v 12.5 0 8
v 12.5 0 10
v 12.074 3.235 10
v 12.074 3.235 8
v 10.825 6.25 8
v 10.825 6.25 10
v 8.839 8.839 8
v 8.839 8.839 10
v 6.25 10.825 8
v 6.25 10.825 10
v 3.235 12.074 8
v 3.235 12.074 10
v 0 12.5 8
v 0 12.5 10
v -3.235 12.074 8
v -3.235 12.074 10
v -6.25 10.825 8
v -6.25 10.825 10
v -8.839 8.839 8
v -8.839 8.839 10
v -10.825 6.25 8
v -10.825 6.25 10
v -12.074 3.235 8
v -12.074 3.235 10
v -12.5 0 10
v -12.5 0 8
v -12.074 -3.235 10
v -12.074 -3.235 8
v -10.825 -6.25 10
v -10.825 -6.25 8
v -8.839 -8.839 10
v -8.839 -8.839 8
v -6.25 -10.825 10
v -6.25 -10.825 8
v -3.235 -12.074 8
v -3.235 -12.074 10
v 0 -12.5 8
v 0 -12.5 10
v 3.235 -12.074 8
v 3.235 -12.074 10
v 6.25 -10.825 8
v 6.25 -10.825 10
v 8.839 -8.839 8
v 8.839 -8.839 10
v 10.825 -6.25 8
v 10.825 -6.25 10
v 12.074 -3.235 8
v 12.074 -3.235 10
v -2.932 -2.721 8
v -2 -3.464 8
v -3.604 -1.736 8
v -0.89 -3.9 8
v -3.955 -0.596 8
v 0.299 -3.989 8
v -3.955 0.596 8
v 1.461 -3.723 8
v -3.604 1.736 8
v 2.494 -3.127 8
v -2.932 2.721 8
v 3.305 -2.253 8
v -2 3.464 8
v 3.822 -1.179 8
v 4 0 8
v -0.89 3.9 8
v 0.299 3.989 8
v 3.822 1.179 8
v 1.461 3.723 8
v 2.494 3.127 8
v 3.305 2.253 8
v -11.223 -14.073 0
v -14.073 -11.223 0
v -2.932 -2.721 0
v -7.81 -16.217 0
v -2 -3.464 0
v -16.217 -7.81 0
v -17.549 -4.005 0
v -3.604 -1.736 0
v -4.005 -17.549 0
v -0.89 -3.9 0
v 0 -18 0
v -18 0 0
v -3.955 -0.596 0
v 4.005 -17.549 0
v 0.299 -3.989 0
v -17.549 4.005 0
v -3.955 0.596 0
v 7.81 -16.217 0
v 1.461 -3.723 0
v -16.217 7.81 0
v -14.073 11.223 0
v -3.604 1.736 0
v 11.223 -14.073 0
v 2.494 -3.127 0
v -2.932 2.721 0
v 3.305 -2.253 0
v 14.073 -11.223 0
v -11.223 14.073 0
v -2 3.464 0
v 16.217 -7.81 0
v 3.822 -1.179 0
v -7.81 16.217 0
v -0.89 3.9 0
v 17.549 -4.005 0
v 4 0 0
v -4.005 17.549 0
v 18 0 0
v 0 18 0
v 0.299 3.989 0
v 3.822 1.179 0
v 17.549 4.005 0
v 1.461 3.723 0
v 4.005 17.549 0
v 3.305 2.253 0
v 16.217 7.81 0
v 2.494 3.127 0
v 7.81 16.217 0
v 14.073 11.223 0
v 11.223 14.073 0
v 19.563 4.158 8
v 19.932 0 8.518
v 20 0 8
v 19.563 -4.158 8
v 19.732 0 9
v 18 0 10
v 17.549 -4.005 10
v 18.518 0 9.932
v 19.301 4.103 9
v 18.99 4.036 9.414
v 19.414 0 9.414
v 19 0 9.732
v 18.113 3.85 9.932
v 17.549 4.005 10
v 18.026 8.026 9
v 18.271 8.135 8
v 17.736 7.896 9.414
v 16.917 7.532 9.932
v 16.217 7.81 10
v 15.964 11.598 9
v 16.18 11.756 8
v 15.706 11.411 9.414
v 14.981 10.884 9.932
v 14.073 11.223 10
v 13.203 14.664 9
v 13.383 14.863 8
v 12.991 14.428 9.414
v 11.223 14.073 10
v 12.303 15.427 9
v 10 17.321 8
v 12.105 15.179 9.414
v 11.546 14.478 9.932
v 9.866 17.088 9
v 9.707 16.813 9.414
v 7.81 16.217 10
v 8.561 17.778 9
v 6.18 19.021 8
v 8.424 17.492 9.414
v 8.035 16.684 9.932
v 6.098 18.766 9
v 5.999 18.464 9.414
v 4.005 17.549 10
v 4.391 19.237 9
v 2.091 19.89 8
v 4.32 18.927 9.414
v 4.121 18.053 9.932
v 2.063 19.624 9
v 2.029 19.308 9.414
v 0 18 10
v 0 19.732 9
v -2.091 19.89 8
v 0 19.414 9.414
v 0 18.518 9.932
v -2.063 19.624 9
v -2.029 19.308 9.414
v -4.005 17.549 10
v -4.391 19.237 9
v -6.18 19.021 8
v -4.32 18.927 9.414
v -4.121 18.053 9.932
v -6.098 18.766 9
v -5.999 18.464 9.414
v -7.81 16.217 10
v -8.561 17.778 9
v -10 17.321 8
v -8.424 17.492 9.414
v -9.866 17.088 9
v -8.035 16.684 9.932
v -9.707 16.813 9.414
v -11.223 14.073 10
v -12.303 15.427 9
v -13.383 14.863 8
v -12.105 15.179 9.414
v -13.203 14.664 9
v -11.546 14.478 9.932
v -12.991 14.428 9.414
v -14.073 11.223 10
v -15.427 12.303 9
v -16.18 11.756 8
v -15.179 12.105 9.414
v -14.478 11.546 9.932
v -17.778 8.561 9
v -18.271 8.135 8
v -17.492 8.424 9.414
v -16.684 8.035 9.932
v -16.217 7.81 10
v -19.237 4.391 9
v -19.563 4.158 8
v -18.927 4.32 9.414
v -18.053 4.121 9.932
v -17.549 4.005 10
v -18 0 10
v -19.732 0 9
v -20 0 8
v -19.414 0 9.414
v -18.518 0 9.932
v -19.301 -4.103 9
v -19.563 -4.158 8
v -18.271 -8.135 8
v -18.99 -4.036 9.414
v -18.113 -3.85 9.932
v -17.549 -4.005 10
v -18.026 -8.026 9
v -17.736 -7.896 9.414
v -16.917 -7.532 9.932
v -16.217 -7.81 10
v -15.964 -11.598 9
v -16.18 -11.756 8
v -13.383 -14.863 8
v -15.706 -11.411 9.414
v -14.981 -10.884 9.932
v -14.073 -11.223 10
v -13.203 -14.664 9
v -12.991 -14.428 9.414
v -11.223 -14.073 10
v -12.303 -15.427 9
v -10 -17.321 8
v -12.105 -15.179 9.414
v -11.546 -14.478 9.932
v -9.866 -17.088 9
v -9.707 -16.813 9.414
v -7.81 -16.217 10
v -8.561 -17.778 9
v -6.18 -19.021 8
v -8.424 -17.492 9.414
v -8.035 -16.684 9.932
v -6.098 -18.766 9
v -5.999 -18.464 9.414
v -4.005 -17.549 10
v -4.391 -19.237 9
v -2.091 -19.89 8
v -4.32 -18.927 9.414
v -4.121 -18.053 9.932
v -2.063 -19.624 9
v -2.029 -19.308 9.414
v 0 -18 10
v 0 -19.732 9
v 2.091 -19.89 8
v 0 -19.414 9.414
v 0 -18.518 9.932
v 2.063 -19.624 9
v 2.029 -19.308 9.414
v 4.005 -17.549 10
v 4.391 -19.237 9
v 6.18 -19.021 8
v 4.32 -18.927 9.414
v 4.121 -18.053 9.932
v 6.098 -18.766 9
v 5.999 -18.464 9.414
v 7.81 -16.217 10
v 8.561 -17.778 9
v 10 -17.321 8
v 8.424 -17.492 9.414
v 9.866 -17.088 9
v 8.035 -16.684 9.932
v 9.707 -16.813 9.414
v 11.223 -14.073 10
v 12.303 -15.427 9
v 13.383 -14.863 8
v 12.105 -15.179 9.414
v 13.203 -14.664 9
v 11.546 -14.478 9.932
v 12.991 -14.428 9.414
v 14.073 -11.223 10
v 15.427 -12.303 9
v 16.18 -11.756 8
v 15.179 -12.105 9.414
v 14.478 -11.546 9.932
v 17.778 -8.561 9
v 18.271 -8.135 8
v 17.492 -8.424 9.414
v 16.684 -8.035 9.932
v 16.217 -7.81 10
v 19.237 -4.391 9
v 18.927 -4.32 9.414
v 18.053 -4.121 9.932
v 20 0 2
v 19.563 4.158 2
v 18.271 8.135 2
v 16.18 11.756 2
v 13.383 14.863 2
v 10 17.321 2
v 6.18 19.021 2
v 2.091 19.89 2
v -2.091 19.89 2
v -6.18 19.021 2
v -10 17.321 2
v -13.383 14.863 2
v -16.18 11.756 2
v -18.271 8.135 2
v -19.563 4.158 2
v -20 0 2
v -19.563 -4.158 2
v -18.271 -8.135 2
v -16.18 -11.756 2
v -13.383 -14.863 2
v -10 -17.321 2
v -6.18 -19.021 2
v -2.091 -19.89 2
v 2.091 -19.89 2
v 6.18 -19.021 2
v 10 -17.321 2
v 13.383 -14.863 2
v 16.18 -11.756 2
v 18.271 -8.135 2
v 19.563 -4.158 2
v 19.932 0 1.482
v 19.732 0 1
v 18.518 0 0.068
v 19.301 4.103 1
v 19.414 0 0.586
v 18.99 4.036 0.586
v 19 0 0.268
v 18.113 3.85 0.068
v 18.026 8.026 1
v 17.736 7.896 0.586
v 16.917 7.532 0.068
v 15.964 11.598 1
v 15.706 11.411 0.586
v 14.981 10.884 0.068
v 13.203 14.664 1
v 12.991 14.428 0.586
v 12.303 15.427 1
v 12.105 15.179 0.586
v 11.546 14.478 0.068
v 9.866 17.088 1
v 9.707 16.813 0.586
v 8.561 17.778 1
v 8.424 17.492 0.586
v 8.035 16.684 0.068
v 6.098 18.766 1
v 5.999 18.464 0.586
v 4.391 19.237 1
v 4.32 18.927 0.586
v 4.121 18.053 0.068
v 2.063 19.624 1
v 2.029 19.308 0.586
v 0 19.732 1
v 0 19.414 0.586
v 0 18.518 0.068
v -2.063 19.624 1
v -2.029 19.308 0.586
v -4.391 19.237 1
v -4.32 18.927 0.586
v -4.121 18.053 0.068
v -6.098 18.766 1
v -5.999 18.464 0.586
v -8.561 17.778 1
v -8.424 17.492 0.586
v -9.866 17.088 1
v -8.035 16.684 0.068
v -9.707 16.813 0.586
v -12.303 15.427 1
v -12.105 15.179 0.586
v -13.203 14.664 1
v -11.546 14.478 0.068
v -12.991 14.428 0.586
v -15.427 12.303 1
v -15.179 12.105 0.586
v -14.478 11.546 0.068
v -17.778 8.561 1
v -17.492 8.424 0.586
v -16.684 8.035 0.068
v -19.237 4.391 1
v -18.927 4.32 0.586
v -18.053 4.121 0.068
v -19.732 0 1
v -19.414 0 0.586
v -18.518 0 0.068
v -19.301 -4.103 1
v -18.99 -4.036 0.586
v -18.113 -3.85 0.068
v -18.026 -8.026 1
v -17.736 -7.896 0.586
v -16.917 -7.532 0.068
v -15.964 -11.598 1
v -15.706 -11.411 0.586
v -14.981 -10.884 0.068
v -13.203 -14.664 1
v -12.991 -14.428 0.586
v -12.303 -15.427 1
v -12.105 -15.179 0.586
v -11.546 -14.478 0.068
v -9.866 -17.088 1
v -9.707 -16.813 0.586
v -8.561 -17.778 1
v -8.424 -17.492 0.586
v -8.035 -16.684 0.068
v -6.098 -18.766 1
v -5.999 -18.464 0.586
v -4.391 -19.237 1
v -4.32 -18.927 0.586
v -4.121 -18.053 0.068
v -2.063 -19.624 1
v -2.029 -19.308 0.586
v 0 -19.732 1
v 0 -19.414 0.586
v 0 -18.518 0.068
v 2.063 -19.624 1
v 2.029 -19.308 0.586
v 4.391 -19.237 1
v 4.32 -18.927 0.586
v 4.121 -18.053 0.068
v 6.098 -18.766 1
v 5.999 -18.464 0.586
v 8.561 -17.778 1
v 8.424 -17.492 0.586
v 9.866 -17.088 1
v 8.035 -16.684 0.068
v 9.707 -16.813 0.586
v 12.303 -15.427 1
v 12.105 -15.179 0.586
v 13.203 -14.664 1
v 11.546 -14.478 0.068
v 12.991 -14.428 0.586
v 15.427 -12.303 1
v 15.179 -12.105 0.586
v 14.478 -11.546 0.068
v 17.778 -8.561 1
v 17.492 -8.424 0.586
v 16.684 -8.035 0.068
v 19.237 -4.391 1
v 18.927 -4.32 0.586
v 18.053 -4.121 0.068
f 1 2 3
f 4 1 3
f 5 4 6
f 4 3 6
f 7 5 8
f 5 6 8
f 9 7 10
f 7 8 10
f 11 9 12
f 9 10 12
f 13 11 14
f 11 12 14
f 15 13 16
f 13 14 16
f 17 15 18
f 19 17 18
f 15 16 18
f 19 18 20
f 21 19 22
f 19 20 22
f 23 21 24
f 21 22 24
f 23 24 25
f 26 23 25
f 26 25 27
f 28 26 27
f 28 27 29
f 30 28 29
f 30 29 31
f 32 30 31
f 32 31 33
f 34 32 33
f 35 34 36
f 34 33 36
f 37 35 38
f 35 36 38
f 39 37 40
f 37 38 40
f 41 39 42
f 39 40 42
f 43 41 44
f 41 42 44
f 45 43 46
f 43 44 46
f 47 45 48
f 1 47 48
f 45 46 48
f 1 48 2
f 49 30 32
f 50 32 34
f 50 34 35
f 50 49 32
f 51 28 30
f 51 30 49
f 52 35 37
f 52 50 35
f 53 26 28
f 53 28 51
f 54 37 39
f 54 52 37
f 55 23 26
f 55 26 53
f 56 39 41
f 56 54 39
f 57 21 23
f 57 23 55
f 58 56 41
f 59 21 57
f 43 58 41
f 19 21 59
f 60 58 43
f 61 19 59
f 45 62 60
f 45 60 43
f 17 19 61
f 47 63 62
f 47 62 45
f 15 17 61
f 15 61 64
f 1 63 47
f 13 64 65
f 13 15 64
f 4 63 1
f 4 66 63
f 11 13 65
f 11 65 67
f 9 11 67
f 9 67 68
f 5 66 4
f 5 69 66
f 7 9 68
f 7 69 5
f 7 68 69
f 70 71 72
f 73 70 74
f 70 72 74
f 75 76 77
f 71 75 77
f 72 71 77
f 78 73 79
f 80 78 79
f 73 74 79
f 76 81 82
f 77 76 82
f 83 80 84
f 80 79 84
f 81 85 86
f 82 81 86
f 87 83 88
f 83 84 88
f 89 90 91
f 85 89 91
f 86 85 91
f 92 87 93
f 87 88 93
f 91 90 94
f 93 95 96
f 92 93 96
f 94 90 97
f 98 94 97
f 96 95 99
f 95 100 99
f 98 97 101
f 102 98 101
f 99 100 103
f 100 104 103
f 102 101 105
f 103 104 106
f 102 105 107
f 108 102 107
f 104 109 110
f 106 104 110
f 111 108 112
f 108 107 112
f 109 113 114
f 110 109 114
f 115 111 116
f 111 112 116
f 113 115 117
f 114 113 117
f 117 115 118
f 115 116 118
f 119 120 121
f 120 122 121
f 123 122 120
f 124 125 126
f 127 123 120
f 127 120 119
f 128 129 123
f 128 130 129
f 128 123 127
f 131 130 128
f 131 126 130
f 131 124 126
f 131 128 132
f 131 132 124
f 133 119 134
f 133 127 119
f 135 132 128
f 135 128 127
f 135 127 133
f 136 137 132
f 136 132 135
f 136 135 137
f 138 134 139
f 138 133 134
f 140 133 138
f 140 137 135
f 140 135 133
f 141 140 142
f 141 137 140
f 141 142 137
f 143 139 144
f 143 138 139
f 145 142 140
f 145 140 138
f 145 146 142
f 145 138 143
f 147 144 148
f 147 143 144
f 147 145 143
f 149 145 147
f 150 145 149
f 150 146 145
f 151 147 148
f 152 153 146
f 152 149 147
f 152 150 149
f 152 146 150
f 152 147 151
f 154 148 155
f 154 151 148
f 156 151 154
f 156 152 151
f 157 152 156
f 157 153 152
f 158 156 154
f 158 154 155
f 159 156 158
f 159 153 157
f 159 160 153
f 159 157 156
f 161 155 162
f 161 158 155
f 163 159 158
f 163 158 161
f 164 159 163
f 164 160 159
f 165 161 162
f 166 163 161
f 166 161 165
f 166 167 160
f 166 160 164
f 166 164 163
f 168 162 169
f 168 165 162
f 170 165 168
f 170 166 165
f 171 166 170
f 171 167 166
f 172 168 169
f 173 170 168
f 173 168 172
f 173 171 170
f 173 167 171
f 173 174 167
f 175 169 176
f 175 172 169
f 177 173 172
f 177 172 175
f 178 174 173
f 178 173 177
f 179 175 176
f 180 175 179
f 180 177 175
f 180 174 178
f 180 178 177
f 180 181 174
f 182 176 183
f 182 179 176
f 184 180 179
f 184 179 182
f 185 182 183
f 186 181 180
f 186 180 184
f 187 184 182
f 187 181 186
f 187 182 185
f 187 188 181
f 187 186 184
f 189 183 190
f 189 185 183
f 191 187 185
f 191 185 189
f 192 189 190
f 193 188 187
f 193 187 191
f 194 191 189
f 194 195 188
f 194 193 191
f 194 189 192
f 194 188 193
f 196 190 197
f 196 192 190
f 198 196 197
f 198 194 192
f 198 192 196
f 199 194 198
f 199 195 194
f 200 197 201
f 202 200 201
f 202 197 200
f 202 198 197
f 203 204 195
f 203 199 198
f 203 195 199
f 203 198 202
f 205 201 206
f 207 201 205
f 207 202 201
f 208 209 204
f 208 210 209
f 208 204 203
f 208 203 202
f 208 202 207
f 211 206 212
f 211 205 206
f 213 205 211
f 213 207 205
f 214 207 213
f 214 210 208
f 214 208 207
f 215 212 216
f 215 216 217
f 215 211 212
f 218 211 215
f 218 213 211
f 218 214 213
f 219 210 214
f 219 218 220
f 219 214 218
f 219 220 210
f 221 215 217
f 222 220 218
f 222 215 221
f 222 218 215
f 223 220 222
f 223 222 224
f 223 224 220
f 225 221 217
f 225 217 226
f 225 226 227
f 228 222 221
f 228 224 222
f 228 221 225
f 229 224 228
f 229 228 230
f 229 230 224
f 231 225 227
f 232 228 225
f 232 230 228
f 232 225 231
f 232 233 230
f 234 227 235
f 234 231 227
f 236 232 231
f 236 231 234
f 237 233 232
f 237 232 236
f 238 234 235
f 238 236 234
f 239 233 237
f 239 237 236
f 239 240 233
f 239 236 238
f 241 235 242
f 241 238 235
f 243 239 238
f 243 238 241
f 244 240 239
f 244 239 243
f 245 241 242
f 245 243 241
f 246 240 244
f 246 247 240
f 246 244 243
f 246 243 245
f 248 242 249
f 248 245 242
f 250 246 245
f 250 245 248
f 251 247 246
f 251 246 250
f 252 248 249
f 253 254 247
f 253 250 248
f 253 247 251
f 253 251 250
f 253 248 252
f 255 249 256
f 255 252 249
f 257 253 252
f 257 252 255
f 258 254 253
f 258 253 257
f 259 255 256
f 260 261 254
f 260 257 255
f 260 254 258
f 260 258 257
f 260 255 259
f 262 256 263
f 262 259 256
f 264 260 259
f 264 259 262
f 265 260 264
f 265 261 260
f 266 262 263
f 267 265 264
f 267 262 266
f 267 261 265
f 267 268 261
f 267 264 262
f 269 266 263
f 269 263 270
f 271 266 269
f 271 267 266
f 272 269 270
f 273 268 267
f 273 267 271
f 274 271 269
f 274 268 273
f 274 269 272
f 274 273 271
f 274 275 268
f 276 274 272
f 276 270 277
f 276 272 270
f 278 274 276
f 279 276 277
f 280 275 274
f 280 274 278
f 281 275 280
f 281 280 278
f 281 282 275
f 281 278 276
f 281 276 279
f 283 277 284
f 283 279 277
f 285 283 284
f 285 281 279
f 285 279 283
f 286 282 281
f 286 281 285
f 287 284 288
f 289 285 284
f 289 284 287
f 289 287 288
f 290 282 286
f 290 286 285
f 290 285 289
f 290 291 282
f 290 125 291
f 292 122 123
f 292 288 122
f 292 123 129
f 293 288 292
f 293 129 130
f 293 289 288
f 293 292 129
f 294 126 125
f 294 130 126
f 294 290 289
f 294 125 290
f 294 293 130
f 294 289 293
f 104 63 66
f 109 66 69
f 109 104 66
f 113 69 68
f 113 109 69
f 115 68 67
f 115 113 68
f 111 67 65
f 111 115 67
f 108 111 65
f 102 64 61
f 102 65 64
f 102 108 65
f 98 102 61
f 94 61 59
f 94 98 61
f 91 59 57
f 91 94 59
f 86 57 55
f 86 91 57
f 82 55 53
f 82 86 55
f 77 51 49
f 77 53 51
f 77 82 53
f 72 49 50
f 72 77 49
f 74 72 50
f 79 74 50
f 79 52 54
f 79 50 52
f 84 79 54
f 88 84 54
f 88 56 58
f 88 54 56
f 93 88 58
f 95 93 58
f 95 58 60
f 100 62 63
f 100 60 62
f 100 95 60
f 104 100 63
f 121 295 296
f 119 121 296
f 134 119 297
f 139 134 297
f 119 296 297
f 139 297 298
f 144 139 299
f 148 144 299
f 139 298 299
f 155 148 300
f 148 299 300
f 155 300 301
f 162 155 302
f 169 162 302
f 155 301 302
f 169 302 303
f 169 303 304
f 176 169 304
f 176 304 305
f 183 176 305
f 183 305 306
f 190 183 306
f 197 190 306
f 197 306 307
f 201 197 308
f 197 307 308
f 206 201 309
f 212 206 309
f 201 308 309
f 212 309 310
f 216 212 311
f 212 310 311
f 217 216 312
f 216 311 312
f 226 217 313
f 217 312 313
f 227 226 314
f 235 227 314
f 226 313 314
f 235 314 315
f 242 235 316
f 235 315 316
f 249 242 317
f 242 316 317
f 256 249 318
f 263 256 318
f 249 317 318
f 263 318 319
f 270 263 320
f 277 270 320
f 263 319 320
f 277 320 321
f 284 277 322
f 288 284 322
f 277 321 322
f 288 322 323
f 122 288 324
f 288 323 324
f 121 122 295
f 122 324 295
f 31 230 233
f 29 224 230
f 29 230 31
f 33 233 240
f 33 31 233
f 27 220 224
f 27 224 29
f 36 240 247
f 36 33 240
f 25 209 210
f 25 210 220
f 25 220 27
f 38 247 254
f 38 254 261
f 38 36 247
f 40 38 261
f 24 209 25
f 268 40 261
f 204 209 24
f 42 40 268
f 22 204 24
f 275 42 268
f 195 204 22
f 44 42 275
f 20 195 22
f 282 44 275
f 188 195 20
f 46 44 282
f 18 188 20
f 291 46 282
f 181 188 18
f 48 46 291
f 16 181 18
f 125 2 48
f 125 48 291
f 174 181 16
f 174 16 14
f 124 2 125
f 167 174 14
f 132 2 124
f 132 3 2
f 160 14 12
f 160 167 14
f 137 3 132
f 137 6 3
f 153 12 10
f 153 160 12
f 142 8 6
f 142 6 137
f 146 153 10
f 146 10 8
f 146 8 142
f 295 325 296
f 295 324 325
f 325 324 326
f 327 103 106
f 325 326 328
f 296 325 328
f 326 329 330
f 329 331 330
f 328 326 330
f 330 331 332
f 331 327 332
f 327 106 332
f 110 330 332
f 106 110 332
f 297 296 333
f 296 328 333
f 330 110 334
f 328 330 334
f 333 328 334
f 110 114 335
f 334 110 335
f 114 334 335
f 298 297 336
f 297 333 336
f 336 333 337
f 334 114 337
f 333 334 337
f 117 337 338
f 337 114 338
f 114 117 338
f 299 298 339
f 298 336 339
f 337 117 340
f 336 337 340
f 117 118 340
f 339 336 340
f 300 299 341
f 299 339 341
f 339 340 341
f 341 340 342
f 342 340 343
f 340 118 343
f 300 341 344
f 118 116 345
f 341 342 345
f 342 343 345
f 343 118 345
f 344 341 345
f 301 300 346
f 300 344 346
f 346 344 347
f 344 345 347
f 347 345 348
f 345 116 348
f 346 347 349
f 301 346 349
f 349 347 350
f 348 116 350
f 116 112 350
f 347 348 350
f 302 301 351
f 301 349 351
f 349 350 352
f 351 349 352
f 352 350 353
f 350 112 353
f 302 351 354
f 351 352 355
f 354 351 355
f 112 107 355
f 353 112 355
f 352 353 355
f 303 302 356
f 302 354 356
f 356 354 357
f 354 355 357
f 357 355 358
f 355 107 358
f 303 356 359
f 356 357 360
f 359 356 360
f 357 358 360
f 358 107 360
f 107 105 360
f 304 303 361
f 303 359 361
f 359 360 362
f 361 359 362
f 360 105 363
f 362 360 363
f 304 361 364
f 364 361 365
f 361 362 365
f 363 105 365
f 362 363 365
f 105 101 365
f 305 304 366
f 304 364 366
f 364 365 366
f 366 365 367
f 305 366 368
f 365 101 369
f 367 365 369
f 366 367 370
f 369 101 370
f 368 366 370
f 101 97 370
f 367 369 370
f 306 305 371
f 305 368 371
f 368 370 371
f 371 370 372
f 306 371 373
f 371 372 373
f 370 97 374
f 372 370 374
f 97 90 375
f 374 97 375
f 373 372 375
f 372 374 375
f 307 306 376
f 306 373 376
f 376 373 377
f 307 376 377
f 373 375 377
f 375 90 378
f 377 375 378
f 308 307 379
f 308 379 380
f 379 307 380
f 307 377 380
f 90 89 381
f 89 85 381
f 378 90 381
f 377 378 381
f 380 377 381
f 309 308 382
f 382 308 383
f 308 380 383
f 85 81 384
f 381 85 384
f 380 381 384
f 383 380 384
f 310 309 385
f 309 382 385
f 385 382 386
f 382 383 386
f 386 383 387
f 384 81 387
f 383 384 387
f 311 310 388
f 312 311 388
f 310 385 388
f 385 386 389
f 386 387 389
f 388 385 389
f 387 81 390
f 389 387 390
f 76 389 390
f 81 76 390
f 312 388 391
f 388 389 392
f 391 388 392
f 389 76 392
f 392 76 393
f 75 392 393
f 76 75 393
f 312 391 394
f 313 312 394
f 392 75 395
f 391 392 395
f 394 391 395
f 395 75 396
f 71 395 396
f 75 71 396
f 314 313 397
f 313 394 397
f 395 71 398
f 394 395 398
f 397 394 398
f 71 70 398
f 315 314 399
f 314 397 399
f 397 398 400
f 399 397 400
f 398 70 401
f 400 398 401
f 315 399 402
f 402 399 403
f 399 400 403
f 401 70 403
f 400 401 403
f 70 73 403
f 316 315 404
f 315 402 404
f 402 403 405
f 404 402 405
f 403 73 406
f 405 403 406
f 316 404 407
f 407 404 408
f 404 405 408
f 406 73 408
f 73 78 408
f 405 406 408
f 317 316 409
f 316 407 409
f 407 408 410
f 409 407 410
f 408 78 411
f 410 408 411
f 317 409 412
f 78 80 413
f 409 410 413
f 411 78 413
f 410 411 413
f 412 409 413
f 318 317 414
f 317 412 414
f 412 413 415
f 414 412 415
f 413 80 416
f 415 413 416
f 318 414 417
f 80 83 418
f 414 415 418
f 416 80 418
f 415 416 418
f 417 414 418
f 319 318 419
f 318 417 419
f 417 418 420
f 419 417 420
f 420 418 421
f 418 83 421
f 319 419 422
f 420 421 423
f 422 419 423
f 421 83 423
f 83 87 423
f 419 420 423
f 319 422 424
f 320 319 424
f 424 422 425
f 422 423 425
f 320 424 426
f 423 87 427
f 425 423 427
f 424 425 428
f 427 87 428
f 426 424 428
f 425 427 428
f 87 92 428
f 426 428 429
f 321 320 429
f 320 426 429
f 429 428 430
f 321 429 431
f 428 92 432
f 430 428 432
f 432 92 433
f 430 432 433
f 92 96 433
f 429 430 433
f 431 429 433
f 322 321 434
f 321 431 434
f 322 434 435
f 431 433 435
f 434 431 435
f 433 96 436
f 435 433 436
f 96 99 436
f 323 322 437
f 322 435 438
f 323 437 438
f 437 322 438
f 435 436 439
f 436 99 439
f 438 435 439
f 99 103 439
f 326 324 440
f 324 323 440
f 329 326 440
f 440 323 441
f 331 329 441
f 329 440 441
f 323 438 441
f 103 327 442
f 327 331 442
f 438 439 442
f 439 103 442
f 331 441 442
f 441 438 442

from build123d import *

# Parameters (mm, degrees)
SKETCH1_R           = 20
BOSS_EXTRUDE1_DEPTH = 10
SKETCH2_R           = 4
CUT_EXTRUDE1_DEPTH  = 11
SKETCH3_R           = 12.5
CUT_EXTRUDE2_DEPTH  = 2
FILLET1_R           = 2


with BuildPart() as part:
    # Sketch1 → Boss-Extrude1 (new body)
    with BuildSketch(Plane.XY):
        Circle(SKETCH1_R)
    extrude(amount=BOSS_EXTRUDE1_DEPTH)

    # Sketch2 → Cut-Extrude1 (cut, through all)
    with BuildSketch(Plane.XY):
        Circle(SKETCH2_R)
    extrude(amount=CUT_EXTRUDE1_DEPTH, mode=Mode.SUBTRACT)

    # Sketch3 → Cut-Extrude2 (cut)
    with BuildSketch(Plane.XY.offset(10)):
        Circle(SKETCH3_R)
    extrude(amount=-CUT_EXTRUDE2_DEPTH, mode=Mode.SUBTRACT)

    # Fillet1
    fillet1_edges = [part.edges().sort_by_distance(p)[0] for p in [
        (-20, 0, 0),
        (-20, 0, 10),
    ]]
    fillet(fillet1_edges, radius=FILLET1_R)


solid = part.part
